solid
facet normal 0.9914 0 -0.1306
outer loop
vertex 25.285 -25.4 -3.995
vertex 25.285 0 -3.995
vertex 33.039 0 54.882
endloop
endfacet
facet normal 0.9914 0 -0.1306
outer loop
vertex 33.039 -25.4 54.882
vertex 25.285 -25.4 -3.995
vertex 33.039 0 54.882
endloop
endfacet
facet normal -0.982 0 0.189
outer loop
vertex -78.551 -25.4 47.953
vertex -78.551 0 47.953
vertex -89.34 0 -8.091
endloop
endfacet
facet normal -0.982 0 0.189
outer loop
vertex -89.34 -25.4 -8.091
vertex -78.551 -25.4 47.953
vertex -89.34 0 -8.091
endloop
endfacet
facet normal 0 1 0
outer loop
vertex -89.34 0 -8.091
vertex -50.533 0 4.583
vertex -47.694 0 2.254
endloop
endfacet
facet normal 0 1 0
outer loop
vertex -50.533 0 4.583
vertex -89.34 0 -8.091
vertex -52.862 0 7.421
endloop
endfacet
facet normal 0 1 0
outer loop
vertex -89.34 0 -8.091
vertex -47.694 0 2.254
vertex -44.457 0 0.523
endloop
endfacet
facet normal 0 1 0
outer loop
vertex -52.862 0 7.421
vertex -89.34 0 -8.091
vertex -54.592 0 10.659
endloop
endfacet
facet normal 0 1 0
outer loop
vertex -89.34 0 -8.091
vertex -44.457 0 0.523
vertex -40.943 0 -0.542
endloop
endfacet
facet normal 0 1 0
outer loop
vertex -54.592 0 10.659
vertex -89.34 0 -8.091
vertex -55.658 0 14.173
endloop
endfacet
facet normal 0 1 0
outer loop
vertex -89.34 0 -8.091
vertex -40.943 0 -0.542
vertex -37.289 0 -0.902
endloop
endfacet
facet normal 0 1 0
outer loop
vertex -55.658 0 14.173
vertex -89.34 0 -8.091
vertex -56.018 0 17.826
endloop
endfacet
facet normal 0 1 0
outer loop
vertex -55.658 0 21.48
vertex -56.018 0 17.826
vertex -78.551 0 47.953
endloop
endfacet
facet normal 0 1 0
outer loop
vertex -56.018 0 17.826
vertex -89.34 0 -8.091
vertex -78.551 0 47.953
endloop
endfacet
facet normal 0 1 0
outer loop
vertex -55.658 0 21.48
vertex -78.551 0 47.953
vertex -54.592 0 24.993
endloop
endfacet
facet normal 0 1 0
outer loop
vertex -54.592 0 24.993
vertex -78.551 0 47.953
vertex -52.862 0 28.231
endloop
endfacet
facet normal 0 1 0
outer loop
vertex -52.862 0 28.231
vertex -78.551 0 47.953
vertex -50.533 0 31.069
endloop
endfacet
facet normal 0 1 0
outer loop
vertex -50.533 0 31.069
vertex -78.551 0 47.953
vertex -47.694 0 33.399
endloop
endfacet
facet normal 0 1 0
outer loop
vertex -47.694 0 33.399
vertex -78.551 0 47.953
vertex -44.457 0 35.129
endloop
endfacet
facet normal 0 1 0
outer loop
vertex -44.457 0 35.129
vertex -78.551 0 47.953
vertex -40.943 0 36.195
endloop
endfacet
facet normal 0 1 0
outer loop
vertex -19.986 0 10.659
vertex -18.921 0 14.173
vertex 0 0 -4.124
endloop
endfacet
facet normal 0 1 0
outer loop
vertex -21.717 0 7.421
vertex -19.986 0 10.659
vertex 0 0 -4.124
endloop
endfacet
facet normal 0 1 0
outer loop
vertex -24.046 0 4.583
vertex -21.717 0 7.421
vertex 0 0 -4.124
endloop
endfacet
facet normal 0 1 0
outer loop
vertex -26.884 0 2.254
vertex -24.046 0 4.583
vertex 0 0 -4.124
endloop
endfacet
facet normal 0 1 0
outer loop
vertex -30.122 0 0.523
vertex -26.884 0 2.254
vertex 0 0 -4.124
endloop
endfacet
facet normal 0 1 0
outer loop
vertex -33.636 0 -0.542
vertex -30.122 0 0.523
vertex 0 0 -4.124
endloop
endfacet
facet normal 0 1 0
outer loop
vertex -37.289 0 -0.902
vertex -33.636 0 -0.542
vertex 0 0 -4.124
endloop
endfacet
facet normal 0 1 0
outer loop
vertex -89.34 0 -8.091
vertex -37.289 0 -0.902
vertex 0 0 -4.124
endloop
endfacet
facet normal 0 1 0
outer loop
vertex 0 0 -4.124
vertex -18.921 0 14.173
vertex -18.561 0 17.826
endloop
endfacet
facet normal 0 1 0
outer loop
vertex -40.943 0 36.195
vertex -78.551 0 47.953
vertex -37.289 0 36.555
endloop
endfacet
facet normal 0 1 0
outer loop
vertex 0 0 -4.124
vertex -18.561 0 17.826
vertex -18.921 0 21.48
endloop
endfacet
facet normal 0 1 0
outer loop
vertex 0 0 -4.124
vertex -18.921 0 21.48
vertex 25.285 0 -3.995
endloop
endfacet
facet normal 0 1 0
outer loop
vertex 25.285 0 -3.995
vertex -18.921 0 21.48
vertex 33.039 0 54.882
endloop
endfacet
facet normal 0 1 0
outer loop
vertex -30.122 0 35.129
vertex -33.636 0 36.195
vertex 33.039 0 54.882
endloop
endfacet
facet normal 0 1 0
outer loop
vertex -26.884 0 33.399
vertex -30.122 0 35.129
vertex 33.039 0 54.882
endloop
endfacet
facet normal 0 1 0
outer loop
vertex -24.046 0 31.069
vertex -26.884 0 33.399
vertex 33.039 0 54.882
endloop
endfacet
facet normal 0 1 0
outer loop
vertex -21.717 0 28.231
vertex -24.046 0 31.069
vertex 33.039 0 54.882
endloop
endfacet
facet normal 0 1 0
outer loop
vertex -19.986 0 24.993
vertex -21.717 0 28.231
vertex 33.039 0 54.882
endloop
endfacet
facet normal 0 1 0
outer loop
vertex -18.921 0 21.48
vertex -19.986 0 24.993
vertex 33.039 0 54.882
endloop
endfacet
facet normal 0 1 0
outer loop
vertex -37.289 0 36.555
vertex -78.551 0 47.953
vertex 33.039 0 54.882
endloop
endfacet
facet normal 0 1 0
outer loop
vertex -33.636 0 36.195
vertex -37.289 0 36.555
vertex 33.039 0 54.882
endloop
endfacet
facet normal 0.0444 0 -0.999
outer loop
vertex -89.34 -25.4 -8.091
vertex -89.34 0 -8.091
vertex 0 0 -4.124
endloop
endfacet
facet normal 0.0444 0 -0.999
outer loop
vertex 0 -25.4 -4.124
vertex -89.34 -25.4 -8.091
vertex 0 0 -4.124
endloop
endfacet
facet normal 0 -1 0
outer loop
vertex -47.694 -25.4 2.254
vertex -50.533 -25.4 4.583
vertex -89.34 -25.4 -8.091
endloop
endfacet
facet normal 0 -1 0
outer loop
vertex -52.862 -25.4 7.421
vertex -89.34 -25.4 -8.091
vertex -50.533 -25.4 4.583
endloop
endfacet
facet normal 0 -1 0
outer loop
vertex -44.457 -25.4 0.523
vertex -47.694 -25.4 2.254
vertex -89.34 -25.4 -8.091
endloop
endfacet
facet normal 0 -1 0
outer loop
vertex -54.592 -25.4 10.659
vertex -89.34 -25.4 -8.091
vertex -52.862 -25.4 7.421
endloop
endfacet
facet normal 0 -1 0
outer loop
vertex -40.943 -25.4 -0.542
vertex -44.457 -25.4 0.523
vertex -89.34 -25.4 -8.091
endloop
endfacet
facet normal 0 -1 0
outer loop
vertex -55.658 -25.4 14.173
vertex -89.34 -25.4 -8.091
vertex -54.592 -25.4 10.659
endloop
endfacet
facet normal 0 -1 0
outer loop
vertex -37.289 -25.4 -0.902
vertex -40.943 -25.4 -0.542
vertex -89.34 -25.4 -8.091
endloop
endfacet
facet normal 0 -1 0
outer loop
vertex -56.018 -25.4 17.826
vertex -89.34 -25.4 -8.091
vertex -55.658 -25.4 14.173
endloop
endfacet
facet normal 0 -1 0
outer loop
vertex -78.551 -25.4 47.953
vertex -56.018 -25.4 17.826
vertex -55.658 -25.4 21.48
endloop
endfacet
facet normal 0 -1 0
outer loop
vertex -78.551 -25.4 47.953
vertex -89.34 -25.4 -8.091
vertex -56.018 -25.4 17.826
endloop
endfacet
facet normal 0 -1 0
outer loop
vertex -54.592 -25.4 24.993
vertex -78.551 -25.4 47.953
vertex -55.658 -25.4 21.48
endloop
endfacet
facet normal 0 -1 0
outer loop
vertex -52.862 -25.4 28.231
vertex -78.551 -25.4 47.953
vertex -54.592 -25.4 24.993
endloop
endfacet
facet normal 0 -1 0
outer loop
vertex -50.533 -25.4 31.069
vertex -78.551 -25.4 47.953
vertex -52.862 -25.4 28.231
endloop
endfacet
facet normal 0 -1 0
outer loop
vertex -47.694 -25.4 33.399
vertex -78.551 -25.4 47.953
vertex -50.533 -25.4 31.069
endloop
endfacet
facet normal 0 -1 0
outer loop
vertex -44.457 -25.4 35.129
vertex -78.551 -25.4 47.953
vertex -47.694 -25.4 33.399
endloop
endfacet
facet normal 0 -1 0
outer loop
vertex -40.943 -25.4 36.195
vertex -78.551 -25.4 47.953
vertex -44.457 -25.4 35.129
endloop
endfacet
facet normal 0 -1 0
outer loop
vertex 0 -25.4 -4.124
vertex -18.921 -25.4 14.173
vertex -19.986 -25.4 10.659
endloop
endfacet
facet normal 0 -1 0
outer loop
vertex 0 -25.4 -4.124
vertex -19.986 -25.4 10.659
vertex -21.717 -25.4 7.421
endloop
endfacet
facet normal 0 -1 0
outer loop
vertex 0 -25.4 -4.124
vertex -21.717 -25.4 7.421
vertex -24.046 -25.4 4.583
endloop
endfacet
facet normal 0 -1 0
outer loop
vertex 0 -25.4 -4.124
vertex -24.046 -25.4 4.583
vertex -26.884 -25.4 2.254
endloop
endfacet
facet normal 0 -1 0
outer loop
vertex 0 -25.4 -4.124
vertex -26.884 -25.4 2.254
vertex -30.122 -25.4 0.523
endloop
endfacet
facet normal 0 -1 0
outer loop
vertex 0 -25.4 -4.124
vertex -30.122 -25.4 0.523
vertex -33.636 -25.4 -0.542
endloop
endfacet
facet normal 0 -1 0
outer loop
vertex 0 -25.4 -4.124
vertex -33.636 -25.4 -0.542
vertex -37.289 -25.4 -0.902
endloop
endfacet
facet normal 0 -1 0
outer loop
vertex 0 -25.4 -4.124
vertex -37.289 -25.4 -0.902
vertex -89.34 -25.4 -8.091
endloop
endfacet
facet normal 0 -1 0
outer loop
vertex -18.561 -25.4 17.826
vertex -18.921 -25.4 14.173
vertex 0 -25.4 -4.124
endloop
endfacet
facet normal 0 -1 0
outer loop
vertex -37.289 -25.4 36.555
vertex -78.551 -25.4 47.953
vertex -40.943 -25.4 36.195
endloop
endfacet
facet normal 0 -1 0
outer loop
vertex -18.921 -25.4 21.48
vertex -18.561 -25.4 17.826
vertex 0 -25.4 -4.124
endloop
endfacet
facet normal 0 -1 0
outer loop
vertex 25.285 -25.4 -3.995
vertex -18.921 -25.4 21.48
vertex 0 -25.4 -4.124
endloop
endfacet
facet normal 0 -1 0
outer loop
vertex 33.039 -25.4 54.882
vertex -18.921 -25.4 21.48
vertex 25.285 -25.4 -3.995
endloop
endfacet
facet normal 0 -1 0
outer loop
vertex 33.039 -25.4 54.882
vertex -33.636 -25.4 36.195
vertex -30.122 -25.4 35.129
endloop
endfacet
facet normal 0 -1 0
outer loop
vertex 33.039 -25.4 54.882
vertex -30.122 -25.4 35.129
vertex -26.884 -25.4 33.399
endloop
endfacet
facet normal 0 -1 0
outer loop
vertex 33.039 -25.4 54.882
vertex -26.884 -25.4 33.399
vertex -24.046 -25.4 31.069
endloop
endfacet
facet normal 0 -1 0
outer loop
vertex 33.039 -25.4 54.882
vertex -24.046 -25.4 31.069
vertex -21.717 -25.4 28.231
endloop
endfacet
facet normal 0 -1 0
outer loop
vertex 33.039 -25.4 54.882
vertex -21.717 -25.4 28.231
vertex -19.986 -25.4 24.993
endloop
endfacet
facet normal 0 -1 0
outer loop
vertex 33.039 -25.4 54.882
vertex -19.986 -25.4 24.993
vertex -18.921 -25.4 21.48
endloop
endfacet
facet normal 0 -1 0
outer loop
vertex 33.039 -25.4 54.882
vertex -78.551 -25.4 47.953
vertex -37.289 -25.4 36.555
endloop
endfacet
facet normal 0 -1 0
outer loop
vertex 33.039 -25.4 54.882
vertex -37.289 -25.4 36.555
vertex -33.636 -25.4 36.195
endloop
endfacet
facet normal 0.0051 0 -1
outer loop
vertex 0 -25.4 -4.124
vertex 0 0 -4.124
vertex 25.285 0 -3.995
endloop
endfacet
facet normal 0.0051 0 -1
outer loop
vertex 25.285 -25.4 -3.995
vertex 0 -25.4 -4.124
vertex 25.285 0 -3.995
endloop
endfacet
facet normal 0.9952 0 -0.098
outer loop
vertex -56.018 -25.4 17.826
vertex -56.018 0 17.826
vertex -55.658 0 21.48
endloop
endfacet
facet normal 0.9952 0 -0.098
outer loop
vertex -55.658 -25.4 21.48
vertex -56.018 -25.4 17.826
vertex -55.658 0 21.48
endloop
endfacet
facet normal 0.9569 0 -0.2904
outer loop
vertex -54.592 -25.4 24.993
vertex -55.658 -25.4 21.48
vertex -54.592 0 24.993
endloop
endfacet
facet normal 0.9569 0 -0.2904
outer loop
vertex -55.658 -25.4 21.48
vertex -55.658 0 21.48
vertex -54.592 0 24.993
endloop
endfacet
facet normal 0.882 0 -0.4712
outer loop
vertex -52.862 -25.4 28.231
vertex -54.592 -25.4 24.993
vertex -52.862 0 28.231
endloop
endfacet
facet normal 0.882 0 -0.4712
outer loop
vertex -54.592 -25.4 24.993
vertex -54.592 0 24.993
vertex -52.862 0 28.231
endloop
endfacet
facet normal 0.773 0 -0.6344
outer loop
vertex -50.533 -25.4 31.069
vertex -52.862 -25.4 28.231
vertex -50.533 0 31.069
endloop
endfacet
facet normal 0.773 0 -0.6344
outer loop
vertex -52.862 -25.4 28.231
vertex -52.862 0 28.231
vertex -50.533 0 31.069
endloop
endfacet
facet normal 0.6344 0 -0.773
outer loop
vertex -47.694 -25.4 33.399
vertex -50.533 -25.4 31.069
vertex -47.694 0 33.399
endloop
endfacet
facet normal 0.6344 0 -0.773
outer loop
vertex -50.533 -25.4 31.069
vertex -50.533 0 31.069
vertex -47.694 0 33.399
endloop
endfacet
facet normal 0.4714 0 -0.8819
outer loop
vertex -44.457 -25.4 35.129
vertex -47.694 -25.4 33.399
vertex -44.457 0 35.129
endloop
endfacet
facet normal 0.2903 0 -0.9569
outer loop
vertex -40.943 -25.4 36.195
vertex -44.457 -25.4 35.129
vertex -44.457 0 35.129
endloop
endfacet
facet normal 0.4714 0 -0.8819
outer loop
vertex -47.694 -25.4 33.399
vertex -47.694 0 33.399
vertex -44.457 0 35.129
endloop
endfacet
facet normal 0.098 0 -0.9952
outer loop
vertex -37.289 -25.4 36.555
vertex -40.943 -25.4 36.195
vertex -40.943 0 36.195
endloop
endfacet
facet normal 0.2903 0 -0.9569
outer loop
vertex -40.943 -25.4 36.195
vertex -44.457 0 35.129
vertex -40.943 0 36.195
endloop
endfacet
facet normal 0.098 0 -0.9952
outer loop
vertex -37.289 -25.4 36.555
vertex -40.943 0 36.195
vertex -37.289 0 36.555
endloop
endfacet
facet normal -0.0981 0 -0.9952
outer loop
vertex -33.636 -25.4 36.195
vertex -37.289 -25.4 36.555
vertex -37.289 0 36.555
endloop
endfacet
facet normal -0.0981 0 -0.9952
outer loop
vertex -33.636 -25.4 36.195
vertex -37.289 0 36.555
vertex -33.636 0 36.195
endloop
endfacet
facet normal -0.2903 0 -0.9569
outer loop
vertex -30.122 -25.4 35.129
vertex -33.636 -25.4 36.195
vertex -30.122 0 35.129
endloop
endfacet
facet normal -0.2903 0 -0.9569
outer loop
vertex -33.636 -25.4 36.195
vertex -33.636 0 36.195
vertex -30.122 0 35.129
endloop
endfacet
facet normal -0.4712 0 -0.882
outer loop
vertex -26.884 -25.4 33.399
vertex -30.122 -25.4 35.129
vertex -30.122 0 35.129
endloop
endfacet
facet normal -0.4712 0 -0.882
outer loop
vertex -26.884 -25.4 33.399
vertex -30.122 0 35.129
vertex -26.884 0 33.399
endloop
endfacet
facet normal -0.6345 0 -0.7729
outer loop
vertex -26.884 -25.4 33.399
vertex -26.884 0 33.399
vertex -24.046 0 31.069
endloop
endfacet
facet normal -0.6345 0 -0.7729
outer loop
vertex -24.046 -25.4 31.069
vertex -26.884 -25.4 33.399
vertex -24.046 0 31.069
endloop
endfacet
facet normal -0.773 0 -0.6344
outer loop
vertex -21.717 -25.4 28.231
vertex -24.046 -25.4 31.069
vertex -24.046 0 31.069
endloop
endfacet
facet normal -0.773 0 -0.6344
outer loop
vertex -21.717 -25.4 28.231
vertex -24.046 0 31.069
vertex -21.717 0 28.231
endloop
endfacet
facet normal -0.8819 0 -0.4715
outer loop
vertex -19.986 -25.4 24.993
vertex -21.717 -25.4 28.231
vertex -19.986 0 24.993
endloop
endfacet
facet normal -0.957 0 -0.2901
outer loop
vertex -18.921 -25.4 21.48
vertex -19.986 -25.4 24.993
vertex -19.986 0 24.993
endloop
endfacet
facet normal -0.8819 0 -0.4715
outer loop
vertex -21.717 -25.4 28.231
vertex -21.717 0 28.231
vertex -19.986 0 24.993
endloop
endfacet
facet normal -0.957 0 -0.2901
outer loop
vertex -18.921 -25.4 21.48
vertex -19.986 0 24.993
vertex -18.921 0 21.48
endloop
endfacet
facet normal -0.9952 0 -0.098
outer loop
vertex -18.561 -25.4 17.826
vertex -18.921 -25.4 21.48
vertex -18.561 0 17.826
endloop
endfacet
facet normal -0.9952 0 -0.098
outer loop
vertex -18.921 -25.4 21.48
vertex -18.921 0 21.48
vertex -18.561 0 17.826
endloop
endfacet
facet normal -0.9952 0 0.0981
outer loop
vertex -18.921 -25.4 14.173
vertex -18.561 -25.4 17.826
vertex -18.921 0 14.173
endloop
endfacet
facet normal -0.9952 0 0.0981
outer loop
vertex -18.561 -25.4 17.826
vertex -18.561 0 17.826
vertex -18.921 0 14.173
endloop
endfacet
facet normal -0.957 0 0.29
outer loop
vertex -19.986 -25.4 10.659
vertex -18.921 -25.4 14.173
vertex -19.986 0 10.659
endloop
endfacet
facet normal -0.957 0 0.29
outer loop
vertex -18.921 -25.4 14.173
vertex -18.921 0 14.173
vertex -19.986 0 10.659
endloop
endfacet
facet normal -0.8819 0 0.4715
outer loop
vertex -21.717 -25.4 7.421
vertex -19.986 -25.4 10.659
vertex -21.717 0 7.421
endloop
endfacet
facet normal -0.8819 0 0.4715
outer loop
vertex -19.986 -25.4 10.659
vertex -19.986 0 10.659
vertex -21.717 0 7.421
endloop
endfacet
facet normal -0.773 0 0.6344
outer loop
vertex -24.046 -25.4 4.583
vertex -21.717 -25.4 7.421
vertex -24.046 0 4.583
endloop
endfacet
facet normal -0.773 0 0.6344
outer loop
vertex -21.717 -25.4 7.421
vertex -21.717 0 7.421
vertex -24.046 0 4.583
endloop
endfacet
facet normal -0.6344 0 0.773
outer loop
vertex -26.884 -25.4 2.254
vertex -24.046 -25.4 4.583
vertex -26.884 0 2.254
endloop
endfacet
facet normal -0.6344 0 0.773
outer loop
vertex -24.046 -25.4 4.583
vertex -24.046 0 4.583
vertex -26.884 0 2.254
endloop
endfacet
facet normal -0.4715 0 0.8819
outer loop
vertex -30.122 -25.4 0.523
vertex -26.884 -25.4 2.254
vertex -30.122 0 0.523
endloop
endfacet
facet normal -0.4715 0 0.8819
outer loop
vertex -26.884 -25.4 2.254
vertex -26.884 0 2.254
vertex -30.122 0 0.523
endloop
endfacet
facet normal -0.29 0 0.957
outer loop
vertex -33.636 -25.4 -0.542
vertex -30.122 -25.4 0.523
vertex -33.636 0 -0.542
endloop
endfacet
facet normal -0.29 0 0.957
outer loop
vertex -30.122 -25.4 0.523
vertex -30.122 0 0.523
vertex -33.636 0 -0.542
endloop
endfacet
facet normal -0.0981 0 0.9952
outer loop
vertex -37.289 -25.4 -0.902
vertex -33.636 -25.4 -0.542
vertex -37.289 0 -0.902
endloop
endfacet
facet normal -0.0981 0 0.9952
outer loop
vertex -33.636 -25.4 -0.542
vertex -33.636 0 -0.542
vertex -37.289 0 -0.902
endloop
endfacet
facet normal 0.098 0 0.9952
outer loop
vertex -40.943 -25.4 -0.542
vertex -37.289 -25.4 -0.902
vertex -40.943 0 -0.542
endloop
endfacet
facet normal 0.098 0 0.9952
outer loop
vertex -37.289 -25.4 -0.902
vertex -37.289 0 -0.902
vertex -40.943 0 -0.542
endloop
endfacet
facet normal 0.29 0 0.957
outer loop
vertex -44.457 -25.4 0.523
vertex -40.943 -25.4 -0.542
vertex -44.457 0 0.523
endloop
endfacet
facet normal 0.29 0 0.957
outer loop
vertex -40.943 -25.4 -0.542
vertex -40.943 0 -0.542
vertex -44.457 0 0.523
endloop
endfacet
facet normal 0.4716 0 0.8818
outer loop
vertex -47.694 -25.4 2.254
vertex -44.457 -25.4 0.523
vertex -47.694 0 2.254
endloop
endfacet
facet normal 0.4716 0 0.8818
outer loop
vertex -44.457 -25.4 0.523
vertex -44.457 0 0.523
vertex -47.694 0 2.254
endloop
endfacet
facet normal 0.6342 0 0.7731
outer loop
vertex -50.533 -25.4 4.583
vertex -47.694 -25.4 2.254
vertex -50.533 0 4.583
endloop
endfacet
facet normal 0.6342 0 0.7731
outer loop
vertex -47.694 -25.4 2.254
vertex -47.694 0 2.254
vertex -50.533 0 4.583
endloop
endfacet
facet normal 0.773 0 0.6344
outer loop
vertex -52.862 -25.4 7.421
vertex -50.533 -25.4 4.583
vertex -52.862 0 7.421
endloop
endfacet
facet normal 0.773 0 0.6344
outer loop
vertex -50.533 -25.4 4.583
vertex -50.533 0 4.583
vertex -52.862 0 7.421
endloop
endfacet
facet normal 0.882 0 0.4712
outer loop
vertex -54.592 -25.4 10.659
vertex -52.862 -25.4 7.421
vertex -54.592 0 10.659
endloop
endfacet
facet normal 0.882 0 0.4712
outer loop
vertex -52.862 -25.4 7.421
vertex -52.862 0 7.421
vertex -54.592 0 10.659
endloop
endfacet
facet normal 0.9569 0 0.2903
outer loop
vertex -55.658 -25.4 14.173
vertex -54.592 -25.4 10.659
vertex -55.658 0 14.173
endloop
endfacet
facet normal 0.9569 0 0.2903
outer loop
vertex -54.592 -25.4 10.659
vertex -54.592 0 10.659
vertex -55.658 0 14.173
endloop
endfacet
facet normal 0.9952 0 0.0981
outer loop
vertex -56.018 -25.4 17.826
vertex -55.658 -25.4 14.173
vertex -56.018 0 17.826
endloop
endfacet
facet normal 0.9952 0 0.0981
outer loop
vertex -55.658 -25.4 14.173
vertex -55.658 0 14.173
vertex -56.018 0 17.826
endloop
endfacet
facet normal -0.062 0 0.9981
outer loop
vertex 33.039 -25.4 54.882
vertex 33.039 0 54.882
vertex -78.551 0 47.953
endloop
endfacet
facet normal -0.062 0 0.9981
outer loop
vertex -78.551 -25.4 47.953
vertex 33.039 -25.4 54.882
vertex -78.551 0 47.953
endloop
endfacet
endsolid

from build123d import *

# Parameters (mm, degrees)
F1_DEPTH = 25.4
F2_R     = 18.728572
F3_DEPTH = 25.4


with BuildPart() as f1:
    # F0 (on Front) → F1 (new body)
    with BuildSketch(Plane.XZ):
        Polygon((-89.339584, -8.090763), (0, -4.123797), (25.28479, -3.994782), (33.038791, 54.881528), (-78.551404, 47.953002), align=None)
    extrude(amount=F1_DEPTH)

    # F2 (on face) → F3 (cut)
    with BuildSketch(Plane(origin=(0, 0, 0), x_dir=(-1, 0, 0), z_dir=(0, 1, 0))):
        with Locations((37.289418, 17.826317)):
            Circle(F2_R)
    extrude(amount=-F3_DEPTH, mode=Mode.SUBTRACT)


solid = f1.part
